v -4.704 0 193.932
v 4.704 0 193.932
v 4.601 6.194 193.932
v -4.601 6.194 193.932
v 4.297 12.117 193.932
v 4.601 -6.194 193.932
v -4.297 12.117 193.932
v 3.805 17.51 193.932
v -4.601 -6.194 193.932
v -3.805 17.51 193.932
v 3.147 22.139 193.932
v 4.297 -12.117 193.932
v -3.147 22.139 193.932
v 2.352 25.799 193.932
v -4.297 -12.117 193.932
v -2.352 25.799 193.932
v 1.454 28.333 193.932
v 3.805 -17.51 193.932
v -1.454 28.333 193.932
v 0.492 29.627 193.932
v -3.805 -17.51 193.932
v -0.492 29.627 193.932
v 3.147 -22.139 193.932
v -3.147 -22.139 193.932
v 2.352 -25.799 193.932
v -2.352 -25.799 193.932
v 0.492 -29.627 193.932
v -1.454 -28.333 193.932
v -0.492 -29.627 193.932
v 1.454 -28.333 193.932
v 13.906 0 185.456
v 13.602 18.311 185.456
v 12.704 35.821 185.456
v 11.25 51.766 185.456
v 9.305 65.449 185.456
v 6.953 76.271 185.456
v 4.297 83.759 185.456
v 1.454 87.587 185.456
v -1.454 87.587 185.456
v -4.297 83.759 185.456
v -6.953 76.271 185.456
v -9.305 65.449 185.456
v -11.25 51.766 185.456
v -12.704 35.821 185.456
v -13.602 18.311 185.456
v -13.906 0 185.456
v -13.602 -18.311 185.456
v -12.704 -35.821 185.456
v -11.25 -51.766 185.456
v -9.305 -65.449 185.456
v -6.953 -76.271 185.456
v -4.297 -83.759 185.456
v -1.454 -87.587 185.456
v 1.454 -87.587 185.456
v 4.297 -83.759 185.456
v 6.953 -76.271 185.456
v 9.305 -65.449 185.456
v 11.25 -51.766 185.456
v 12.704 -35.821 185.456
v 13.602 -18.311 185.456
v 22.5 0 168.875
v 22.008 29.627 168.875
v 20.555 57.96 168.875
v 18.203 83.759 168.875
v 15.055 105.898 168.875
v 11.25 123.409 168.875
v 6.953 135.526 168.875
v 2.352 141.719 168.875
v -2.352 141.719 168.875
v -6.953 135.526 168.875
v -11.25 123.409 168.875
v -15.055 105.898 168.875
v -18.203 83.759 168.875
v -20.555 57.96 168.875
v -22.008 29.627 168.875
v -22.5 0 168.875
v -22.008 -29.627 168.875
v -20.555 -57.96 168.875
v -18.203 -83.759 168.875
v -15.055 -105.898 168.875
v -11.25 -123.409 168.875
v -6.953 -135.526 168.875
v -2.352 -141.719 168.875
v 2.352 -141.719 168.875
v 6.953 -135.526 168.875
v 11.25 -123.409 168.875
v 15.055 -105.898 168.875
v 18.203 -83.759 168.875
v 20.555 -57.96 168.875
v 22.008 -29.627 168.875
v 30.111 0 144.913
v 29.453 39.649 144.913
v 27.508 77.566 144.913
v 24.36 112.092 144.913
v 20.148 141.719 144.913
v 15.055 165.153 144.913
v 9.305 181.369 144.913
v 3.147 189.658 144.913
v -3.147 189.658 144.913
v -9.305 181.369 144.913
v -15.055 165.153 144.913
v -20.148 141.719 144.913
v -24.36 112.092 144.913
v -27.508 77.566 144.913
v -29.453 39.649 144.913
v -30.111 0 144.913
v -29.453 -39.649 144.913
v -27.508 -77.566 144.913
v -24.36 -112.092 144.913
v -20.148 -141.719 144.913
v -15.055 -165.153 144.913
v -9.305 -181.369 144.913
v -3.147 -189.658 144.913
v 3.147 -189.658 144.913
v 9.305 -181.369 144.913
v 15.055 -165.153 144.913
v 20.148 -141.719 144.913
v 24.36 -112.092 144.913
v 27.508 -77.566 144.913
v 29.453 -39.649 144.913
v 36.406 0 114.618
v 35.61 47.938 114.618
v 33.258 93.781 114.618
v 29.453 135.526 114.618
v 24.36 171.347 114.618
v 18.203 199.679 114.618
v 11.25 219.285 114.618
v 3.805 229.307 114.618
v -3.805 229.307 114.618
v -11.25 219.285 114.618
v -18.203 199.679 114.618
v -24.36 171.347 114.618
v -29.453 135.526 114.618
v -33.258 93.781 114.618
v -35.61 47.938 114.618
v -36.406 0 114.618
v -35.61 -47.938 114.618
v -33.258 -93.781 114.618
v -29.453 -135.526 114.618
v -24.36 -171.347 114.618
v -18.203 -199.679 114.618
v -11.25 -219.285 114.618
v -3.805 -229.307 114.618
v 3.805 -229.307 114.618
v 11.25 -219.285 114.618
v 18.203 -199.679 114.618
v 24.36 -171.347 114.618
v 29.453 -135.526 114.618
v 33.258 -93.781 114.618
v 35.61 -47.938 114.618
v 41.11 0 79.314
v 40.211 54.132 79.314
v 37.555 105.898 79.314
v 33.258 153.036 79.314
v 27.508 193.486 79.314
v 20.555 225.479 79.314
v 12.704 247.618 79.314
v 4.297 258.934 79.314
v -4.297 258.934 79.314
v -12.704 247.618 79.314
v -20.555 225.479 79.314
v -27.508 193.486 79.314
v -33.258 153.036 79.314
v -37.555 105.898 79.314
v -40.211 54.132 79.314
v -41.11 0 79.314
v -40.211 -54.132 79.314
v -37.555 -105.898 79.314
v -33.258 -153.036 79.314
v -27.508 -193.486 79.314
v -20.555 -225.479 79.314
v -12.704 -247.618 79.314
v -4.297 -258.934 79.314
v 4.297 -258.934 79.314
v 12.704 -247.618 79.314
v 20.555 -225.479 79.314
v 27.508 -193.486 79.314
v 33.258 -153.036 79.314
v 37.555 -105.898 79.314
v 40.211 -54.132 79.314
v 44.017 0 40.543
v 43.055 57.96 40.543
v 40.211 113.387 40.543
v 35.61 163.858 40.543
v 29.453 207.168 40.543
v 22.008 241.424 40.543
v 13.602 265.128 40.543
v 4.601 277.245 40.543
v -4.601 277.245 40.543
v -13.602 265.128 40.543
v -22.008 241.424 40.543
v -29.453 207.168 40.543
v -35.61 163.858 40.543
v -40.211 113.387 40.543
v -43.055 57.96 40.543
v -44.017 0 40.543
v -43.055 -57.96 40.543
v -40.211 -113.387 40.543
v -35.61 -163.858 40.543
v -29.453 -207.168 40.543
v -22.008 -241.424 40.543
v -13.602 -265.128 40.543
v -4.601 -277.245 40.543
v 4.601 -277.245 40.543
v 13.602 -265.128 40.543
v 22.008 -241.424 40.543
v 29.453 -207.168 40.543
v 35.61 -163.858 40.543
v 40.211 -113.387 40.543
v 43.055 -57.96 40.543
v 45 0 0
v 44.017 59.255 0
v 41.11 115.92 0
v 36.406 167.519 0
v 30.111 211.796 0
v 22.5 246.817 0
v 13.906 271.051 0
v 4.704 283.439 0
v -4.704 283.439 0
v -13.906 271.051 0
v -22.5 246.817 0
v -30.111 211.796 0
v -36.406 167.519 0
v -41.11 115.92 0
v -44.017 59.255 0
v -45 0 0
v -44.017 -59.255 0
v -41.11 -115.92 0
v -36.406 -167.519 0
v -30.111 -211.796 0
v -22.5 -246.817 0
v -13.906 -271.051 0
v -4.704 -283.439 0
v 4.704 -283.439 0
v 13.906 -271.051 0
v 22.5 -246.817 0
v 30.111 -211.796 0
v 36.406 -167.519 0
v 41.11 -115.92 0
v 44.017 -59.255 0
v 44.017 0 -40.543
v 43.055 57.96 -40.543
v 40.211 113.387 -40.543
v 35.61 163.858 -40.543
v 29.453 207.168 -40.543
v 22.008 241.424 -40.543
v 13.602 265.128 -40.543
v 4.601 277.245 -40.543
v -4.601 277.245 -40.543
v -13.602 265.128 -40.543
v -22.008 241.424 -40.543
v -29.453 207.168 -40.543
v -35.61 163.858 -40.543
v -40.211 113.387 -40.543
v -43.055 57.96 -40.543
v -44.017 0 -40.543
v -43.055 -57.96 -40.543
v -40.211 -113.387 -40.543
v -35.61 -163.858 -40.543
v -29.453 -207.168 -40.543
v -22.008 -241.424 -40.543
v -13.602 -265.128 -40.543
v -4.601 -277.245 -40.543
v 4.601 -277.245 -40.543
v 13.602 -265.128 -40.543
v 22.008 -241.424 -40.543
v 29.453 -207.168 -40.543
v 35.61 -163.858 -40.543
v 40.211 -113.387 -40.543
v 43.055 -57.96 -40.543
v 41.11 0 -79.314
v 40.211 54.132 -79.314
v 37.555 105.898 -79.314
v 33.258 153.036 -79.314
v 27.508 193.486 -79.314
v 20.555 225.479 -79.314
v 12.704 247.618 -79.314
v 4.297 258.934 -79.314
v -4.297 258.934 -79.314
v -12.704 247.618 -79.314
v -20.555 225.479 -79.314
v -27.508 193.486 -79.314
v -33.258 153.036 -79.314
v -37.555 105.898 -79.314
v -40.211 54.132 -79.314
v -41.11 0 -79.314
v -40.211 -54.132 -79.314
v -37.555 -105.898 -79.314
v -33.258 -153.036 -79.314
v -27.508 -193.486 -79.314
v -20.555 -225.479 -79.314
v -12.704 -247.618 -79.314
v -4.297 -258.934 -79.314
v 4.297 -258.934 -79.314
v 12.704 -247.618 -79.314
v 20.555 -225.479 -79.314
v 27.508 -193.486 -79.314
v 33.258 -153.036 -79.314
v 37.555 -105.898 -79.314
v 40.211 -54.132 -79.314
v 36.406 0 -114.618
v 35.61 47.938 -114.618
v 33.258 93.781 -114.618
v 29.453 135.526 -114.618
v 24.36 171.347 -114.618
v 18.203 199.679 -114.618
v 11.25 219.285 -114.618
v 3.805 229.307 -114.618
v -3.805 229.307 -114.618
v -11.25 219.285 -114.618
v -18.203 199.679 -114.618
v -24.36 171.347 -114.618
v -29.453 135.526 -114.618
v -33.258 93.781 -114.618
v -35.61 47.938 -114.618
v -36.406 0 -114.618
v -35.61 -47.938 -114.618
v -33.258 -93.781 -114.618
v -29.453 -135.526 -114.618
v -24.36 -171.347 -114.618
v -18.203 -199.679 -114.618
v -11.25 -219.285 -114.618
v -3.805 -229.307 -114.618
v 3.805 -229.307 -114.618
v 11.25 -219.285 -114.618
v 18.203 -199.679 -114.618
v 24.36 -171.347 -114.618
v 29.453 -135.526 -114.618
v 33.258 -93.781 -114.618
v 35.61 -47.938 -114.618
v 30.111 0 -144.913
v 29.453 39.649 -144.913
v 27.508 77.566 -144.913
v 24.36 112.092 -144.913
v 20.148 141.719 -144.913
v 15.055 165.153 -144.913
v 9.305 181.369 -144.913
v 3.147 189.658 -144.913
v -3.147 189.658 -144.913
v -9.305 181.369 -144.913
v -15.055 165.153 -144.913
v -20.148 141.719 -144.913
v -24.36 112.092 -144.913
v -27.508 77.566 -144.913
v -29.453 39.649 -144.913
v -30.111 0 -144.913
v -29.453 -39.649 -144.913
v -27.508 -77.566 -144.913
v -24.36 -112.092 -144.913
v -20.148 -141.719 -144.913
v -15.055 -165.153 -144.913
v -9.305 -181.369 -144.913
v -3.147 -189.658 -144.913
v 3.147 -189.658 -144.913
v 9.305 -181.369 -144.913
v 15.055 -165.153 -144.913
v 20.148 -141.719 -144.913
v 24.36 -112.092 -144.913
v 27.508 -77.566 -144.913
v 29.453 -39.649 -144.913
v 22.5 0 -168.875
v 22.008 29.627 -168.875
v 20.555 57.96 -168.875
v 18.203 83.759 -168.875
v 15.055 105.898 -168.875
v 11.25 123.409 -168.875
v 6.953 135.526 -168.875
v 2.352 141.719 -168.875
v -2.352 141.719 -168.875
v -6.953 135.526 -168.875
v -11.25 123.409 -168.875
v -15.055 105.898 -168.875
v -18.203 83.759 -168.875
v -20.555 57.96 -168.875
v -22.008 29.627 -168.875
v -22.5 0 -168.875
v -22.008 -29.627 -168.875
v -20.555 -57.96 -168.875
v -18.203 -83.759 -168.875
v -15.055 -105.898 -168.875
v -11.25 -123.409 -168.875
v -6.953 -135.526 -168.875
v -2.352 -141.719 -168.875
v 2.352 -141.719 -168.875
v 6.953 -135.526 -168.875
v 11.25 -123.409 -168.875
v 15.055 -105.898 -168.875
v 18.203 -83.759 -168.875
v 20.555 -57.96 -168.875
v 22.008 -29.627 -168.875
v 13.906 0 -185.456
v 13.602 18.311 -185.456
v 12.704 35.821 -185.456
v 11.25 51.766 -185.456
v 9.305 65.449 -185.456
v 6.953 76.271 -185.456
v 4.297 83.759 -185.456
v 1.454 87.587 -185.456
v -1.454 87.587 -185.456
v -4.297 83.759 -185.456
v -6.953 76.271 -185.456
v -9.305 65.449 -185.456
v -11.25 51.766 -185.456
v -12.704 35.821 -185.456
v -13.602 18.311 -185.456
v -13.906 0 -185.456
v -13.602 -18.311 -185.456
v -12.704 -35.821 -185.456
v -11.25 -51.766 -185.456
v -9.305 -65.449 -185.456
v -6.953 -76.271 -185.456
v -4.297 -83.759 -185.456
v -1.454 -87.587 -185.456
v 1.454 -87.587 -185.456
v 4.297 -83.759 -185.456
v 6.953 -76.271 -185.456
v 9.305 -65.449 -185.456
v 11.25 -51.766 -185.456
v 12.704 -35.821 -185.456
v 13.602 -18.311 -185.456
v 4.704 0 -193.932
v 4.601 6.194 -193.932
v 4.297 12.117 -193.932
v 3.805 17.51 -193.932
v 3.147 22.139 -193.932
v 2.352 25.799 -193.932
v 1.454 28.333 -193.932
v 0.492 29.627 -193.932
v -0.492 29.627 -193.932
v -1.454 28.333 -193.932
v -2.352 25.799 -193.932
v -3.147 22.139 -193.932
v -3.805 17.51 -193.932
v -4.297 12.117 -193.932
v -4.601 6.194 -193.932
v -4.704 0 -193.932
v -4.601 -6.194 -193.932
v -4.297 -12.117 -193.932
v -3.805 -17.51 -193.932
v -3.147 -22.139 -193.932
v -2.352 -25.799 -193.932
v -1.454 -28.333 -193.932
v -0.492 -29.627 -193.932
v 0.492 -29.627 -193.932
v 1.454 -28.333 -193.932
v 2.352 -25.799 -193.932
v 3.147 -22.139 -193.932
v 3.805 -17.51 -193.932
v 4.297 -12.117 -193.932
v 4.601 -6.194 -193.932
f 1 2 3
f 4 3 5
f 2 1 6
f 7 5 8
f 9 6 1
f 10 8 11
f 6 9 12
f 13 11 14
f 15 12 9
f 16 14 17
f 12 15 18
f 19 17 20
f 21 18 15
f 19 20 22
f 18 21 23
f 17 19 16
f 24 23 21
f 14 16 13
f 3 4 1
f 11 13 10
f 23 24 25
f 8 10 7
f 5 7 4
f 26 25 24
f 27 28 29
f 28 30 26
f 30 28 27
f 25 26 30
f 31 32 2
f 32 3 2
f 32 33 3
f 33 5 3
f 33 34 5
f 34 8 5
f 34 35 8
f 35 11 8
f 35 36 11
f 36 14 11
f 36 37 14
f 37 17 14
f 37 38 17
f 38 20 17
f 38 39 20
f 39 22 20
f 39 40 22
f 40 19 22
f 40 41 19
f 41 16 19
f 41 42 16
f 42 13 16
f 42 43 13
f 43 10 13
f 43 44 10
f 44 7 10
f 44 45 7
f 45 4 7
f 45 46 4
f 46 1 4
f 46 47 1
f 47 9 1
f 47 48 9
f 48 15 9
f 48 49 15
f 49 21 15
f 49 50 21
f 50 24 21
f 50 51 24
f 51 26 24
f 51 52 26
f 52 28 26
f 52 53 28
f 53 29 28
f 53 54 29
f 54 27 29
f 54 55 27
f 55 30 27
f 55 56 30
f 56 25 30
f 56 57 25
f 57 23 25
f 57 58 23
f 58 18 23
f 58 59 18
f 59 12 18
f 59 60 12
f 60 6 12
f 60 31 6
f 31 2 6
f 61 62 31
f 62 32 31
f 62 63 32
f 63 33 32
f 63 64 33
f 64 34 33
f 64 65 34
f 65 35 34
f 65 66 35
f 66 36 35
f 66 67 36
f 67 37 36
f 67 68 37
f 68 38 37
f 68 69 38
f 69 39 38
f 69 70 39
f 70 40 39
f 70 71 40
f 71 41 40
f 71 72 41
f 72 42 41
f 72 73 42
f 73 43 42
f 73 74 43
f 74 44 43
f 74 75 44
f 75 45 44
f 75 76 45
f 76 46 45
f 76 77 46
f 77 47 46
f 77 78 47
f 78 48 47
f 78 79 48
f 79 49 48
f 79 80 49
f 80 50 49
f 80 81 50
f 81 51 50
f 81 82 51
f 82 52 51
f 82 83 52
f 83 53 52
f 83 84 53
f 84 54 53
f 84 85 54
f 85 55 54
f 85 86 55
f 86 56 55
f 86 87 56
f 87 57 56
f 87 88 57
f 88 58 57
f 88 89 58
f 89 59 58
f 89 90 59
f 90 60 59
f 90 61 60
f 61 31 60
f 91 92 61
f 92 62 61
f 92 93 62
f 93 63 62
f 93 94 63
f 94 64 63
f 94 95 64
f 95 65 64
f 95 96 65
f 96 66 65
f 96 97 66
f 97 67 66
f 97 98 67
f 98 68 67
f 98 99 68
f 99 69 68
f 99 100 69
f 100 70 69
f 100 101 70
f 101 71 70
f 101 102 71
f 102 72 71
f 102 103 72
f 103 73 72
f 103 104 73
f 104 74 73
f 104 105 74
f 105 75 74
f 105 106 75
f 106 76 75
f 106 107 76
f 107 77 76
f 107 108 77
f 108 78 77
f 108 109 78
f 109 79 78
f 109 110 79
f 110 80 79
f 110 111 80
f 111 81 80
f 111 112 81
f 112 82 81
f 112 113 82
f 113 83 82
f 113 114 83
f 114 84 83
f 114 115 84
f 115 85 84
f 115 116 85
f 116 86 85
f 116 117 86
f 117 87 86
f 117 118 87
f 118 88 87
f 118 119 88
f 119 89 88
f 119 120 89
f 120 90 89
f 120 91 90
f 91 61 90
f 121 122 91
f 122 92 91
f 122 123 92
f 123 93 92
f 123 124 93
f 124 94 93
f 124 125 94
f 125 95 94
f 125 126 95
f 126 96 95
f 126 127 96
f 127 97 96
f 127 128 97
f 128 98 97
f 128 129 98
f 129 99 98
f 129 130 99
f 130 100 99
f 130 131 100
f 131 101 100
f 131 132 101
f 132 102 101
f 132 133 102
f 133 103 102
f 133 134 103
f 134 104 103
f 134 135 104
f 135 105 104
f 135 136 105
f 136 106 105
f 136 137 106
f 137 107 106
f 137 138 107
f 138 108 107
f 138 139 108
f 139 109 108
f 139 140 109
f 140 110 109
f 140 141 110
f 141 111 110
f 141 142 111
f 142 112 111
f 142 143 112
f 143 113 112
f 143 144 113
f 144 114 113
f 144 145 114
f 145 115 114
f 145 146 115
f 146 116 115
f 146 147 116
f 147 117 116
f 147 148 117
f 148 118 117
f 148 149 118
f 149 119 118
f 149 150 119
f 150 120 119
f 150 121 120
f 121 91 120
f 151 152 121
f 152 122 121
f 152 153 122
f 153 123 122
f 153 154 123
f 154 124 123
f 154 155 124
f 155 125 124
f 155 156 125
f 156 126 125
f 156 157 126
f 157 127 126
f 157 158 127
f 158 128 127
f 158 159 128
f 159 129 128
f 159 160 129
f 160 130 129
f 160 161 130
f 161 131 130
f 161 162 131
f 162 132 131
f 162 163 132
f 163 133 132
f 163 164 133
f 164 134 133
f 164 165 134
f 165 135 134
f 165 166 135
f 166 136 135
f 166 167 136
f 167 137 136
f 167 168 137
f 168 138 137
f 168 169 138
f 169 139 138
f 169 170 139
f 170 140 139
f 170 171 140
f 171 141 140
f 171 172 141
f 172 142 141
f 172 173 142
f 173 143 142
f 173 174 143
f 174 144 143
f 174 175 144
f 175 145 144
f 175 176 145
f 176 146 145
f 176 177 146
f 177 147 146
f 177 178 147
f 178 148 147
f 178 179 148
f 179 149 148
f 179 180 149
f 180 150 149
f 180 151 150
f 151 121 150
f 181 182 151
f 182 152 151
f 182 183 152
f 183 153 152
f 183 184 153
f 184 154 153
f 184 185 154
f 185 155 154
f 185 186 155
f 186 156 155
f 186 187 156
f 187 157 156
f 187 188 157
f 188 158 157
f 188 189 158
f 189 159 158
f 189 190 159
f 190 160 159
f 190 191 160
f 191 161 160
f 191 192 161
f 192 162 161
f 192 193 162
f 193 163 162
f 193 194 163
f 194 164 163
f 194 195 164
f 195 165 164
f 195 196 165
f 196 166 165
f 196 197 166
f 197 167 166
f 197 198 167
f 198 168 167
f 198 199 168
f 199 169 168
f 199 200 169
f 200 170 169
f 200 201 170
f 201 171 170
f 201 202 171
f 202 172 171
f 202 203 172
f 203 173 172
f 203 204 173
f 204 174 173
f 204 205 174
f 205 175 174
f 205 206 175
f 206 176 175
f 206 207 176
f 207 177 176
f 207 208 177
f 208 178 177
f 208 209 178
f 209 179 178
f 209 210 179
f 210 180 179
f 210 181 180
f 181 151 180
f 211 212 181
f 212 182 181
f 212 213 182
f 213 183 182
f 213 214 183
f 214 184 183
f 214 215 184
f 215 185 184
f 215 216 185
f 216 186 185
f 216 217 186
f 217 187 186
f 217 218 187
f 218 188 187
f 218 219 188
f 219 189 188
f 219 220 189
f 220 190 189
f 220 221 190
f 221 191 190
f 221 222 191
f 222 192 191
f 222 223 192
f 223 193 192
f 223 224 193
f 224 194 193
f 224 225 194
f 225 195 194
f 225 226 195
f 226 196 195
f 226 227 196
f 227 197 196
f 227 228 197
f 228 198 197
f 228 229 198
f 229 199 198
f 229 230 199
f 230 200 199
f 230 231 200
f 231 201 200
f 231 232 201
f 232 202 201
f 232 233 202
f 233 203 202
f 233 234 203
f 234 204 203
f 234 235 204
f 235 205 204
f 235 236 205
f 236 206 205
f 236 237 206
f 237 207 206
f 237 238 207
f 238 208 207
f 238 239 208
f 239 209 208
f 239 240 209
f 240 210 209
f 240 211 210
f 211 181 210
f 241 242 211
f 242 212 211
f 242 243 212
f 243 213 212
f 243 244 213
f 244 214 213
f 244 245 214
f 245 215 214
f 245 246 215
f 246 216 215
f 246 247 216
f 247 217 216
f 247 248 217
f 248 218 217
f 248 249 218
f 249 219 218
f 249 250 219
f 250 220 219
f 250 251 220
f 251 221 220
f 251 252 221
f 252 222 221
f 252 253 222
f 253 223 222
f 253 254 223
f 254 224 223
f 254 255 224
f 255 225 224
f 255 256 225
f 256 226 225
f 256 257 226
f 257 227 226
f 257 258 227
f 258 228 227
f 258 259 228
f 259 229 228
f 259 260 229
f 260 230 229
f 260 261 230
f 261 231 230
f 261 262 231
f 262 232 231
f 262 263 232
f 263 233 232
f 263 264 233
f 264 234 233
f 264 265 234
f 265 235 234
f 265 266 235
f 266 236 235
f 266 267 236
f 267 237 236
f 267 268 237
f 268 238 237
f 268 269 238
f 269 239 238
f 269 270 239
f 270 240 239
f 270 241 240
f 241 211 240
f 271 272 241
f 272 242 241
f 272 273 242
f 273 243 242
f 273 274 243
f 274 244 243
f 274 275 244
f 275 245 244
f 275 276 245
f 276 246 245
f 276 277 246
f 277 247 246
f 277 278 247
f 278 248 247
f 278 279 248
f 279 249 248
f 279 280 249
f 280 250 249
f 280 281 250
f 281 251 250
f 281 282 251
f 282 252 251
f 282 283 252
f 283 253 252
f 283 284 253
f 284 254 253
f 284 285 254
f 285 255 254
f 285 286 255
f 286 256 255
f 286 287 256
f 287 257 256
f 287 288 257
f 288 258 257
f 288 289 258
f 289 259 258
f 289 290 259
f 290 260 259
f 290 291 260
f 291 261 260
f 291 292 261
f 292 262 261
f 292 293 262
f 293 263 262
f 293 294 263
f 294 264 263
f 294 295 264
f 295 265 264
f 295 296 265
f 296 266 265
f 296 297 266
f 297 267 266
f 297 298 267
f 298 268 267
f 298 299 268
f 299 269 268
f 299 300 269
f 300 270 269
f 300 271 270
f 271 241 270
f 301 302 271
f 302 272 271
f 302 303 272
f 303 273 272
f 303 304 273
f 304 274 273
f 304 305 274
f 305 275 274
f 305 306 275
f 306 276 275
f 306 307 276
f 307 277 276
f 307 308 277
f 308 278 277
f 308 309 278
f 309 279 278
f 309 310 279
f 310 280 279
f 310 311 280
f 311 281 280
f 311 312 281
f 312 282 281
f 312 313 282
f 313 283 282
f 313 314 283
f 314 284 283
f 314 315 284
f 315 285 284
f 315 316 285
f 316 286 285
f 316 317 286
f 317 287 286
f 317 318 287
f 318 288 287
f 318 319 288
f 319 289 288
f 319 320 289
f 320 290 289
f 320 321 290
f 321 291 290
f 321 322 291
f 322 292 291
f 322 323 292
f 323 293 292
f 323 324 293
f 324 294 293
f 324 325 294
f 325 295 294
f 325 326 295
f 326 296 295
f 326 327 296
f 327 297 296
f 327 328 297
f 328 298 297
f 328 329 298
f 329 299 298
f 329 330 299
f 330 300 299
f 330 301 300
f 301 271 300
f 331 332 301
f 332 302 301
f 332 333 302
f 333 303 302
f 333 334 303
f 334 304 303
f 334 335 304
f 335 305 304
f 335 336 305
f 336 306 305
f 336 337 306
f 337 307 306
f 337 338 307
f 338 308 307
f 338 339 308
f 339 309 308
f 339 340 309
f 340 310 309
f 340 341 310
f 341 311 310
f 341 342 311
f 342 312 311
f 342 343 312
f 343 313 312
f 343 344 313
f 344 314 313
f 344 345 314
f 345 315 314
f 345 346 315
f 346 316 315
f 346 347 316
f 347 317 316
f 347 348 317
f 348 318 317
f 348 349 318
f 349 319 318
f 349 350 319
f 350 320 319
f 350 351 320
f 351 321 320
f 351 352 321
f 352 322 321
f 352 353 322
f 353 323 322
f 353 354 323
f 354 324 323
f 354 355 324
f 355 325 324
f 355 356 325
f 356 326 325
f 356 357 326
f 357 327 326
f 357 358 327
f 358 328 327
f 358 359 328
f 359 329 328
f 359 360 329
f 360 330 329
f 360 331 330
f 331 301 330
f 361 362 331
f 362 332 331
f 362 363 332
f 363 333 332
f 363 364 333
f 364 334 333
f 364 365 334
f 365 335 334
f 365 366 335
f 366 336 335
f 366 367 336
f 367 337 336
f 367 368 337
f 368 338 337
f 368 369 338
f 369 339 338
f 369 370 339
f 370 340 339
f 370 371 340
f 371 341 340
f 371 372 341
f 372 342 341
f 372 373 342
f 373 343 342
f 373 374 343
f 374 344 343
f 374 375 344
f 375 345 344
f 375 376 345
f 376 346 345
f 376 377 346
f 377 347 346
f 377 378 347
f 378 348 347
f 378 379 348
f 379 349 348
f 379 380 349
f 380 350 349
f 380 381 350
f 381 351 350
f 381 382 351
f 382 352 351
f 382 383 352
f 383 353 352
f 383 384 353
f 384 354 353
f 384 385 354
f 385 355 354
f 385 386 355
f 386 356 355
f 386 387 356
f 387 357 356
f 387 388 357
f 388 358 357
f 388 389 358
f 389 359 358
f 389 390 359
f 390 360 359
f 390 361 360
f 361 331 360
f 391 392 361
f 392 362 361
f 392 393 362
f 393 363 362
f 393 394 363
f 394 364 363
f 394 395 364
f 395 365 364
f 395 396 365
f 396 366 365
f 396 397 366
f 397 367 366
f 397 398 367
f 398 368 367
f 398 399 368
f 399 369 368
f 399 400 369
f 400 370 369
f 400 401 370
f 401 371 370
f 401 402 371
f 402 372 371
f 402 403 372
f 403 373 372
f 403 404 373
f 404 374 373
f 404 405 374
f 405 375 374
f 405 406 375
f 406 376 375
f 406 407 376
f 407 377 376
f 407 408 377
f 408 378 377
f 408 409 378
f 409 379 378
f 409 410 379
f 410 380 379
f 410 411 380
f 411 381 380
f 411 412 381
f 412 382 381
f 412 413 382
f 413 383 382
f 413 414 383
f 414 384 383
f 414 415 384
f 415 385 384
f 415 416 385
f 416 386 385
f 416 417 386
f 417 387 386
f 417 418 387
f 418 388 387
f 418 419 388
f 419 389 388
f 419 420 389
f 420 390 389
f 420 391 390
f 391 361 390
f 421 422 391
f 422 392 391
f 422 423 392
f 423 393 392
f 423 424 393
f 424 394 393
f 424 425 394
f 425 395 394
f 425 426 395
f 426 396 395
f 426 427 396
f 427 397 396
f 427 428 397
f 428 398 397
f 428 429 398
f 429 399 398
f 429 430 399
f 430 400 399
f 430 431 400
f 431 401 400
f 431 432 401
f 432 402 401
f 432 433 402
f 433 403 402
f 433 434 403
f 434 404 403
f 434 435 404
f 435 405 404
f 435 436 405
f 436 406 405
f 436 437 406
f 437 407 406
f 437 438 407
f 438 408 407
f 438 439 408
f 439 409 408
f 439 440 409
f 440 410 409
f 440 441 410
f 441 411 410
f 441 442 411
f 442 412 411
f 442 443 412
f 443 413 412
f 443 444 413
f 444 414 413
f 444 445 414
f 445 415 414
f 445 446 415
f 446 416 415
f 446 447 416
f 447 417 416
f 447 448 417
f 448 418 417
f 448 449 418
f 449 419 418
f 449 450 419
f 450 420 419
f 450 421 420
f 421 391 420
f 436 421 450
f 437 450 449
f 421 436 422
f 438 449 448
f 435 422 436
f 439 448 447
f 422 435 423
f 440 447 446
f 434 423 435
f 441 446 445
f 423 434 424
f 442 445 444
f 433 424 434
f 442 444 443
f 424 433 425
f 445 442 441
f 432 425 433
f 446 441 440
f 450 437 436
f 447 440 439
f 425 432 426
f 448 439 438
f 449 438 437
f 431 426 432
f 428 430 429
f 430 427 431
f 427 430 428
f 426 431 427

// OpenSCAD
// Generated by SolidPython 1.0.1 on 2020-07-29 00:46:46


scale(v = [3, 19, 13]) {
	sphere(r = 15);
}
/***********************************************
*********      SolidPython code:      **********
************************************************
 
# import packages: SolidPython
from solid import *
from solid.utils import *
from itertools import chain, combinations, permutations


class Resize:

    def __init__(self, scad_file):
        self.scad_file = scad_file
        #self.scad_file = import_scad(scad_file)
        # cone/cylinder param:
        self.r1 = 0
        self.r2 = 0
        self.h = 0
        # rectangular prism param:
        self.w = 0
        self.l = 0
        # ellipse param:
        self.r = 0

    # import OpenScad code (file name corresponds to shape)


    # classify shape + parameters
    def assign(self, param1, param2, param3):
        if self.scad_file == 'cone.scad':
            self.r1 = param1
            self.r2 = param2
            self.h = param3
        elif self.scad_file == 'cylinder.scad':
            self.r1 = param1
            self.r2 = param2
            self.h = param3
        elif self.scad_file == 'rectangularPrism.scad':
            self.h = param1
            self.l = param2
            self.w = param3
        else:
            self.r = param1
            self.h = param2

    # resize parameters
    def iterate(self):
        x = range(3, 20, 2)
        i = 1
        if self.scad_file == 'cone.scad':
            tempList = list(permutations(x, 2))
            for temp in tempList:
                param1 = temp[0]
                param2 = temp[1]
                filepath = 'produced_scad_files/' + 'cone' + str(param1) + '_' + str(param2) + '_' + '.scad'
                scad_render_to_file(cylinder(h=param1, r1=param2, r2=0), filepath)

        elif self.scad_file == 'cylinder.scad':
            tempList = list(permutations(x, 3))
            for temp in tempList:
                param1 = temp[0]
                param2 = temp[1]
                filepath = 'produced_scad_files/' + 'cylinder' + str(param1) + '_' + str(param2) + '_' + '.scad'
                scad_render_to_file(cylinder(h=param1, r1=param2, r2=param2), filepath)

        elif self.scad_file == 'rectangularPrism.scad':
            tempList = list(permutations(x, 3))
            for temp in tempList:
                param1 = temp[0]
                param2 = temp[1]
                param3 = temp[2]
                filepath = 'produced_scad_files/' + 'rectangularPrism' + str(param1) + '_' + str(param2) + '_' + str(
                    param3) + '.scad'
                scad_render_to_file(cube(size=(param1, param2, param3)), filepath)

        elif self.scad_file == 'ellipse.scad':
            tempList = list(permutations(x, 4))
            for temp in tempList:
                param1 = temp[0]
                param2 = temp[1]
                param3 = temp[2]
                param4 = temp[3]
                filepath = 'produced_scad_files/' + 'ellipse' + str(param1) + '_' + str(param2) + '_' + str(param3) + '_' + str(param4) + '.scad'
                scad_render_to_file(scale([param1, param2, param3])(sphere(r=param4)), filepath)

    def render_to_scadfile(self):
        scad_render_to_file(scad, 'example.scad') 
 
************************************************/
